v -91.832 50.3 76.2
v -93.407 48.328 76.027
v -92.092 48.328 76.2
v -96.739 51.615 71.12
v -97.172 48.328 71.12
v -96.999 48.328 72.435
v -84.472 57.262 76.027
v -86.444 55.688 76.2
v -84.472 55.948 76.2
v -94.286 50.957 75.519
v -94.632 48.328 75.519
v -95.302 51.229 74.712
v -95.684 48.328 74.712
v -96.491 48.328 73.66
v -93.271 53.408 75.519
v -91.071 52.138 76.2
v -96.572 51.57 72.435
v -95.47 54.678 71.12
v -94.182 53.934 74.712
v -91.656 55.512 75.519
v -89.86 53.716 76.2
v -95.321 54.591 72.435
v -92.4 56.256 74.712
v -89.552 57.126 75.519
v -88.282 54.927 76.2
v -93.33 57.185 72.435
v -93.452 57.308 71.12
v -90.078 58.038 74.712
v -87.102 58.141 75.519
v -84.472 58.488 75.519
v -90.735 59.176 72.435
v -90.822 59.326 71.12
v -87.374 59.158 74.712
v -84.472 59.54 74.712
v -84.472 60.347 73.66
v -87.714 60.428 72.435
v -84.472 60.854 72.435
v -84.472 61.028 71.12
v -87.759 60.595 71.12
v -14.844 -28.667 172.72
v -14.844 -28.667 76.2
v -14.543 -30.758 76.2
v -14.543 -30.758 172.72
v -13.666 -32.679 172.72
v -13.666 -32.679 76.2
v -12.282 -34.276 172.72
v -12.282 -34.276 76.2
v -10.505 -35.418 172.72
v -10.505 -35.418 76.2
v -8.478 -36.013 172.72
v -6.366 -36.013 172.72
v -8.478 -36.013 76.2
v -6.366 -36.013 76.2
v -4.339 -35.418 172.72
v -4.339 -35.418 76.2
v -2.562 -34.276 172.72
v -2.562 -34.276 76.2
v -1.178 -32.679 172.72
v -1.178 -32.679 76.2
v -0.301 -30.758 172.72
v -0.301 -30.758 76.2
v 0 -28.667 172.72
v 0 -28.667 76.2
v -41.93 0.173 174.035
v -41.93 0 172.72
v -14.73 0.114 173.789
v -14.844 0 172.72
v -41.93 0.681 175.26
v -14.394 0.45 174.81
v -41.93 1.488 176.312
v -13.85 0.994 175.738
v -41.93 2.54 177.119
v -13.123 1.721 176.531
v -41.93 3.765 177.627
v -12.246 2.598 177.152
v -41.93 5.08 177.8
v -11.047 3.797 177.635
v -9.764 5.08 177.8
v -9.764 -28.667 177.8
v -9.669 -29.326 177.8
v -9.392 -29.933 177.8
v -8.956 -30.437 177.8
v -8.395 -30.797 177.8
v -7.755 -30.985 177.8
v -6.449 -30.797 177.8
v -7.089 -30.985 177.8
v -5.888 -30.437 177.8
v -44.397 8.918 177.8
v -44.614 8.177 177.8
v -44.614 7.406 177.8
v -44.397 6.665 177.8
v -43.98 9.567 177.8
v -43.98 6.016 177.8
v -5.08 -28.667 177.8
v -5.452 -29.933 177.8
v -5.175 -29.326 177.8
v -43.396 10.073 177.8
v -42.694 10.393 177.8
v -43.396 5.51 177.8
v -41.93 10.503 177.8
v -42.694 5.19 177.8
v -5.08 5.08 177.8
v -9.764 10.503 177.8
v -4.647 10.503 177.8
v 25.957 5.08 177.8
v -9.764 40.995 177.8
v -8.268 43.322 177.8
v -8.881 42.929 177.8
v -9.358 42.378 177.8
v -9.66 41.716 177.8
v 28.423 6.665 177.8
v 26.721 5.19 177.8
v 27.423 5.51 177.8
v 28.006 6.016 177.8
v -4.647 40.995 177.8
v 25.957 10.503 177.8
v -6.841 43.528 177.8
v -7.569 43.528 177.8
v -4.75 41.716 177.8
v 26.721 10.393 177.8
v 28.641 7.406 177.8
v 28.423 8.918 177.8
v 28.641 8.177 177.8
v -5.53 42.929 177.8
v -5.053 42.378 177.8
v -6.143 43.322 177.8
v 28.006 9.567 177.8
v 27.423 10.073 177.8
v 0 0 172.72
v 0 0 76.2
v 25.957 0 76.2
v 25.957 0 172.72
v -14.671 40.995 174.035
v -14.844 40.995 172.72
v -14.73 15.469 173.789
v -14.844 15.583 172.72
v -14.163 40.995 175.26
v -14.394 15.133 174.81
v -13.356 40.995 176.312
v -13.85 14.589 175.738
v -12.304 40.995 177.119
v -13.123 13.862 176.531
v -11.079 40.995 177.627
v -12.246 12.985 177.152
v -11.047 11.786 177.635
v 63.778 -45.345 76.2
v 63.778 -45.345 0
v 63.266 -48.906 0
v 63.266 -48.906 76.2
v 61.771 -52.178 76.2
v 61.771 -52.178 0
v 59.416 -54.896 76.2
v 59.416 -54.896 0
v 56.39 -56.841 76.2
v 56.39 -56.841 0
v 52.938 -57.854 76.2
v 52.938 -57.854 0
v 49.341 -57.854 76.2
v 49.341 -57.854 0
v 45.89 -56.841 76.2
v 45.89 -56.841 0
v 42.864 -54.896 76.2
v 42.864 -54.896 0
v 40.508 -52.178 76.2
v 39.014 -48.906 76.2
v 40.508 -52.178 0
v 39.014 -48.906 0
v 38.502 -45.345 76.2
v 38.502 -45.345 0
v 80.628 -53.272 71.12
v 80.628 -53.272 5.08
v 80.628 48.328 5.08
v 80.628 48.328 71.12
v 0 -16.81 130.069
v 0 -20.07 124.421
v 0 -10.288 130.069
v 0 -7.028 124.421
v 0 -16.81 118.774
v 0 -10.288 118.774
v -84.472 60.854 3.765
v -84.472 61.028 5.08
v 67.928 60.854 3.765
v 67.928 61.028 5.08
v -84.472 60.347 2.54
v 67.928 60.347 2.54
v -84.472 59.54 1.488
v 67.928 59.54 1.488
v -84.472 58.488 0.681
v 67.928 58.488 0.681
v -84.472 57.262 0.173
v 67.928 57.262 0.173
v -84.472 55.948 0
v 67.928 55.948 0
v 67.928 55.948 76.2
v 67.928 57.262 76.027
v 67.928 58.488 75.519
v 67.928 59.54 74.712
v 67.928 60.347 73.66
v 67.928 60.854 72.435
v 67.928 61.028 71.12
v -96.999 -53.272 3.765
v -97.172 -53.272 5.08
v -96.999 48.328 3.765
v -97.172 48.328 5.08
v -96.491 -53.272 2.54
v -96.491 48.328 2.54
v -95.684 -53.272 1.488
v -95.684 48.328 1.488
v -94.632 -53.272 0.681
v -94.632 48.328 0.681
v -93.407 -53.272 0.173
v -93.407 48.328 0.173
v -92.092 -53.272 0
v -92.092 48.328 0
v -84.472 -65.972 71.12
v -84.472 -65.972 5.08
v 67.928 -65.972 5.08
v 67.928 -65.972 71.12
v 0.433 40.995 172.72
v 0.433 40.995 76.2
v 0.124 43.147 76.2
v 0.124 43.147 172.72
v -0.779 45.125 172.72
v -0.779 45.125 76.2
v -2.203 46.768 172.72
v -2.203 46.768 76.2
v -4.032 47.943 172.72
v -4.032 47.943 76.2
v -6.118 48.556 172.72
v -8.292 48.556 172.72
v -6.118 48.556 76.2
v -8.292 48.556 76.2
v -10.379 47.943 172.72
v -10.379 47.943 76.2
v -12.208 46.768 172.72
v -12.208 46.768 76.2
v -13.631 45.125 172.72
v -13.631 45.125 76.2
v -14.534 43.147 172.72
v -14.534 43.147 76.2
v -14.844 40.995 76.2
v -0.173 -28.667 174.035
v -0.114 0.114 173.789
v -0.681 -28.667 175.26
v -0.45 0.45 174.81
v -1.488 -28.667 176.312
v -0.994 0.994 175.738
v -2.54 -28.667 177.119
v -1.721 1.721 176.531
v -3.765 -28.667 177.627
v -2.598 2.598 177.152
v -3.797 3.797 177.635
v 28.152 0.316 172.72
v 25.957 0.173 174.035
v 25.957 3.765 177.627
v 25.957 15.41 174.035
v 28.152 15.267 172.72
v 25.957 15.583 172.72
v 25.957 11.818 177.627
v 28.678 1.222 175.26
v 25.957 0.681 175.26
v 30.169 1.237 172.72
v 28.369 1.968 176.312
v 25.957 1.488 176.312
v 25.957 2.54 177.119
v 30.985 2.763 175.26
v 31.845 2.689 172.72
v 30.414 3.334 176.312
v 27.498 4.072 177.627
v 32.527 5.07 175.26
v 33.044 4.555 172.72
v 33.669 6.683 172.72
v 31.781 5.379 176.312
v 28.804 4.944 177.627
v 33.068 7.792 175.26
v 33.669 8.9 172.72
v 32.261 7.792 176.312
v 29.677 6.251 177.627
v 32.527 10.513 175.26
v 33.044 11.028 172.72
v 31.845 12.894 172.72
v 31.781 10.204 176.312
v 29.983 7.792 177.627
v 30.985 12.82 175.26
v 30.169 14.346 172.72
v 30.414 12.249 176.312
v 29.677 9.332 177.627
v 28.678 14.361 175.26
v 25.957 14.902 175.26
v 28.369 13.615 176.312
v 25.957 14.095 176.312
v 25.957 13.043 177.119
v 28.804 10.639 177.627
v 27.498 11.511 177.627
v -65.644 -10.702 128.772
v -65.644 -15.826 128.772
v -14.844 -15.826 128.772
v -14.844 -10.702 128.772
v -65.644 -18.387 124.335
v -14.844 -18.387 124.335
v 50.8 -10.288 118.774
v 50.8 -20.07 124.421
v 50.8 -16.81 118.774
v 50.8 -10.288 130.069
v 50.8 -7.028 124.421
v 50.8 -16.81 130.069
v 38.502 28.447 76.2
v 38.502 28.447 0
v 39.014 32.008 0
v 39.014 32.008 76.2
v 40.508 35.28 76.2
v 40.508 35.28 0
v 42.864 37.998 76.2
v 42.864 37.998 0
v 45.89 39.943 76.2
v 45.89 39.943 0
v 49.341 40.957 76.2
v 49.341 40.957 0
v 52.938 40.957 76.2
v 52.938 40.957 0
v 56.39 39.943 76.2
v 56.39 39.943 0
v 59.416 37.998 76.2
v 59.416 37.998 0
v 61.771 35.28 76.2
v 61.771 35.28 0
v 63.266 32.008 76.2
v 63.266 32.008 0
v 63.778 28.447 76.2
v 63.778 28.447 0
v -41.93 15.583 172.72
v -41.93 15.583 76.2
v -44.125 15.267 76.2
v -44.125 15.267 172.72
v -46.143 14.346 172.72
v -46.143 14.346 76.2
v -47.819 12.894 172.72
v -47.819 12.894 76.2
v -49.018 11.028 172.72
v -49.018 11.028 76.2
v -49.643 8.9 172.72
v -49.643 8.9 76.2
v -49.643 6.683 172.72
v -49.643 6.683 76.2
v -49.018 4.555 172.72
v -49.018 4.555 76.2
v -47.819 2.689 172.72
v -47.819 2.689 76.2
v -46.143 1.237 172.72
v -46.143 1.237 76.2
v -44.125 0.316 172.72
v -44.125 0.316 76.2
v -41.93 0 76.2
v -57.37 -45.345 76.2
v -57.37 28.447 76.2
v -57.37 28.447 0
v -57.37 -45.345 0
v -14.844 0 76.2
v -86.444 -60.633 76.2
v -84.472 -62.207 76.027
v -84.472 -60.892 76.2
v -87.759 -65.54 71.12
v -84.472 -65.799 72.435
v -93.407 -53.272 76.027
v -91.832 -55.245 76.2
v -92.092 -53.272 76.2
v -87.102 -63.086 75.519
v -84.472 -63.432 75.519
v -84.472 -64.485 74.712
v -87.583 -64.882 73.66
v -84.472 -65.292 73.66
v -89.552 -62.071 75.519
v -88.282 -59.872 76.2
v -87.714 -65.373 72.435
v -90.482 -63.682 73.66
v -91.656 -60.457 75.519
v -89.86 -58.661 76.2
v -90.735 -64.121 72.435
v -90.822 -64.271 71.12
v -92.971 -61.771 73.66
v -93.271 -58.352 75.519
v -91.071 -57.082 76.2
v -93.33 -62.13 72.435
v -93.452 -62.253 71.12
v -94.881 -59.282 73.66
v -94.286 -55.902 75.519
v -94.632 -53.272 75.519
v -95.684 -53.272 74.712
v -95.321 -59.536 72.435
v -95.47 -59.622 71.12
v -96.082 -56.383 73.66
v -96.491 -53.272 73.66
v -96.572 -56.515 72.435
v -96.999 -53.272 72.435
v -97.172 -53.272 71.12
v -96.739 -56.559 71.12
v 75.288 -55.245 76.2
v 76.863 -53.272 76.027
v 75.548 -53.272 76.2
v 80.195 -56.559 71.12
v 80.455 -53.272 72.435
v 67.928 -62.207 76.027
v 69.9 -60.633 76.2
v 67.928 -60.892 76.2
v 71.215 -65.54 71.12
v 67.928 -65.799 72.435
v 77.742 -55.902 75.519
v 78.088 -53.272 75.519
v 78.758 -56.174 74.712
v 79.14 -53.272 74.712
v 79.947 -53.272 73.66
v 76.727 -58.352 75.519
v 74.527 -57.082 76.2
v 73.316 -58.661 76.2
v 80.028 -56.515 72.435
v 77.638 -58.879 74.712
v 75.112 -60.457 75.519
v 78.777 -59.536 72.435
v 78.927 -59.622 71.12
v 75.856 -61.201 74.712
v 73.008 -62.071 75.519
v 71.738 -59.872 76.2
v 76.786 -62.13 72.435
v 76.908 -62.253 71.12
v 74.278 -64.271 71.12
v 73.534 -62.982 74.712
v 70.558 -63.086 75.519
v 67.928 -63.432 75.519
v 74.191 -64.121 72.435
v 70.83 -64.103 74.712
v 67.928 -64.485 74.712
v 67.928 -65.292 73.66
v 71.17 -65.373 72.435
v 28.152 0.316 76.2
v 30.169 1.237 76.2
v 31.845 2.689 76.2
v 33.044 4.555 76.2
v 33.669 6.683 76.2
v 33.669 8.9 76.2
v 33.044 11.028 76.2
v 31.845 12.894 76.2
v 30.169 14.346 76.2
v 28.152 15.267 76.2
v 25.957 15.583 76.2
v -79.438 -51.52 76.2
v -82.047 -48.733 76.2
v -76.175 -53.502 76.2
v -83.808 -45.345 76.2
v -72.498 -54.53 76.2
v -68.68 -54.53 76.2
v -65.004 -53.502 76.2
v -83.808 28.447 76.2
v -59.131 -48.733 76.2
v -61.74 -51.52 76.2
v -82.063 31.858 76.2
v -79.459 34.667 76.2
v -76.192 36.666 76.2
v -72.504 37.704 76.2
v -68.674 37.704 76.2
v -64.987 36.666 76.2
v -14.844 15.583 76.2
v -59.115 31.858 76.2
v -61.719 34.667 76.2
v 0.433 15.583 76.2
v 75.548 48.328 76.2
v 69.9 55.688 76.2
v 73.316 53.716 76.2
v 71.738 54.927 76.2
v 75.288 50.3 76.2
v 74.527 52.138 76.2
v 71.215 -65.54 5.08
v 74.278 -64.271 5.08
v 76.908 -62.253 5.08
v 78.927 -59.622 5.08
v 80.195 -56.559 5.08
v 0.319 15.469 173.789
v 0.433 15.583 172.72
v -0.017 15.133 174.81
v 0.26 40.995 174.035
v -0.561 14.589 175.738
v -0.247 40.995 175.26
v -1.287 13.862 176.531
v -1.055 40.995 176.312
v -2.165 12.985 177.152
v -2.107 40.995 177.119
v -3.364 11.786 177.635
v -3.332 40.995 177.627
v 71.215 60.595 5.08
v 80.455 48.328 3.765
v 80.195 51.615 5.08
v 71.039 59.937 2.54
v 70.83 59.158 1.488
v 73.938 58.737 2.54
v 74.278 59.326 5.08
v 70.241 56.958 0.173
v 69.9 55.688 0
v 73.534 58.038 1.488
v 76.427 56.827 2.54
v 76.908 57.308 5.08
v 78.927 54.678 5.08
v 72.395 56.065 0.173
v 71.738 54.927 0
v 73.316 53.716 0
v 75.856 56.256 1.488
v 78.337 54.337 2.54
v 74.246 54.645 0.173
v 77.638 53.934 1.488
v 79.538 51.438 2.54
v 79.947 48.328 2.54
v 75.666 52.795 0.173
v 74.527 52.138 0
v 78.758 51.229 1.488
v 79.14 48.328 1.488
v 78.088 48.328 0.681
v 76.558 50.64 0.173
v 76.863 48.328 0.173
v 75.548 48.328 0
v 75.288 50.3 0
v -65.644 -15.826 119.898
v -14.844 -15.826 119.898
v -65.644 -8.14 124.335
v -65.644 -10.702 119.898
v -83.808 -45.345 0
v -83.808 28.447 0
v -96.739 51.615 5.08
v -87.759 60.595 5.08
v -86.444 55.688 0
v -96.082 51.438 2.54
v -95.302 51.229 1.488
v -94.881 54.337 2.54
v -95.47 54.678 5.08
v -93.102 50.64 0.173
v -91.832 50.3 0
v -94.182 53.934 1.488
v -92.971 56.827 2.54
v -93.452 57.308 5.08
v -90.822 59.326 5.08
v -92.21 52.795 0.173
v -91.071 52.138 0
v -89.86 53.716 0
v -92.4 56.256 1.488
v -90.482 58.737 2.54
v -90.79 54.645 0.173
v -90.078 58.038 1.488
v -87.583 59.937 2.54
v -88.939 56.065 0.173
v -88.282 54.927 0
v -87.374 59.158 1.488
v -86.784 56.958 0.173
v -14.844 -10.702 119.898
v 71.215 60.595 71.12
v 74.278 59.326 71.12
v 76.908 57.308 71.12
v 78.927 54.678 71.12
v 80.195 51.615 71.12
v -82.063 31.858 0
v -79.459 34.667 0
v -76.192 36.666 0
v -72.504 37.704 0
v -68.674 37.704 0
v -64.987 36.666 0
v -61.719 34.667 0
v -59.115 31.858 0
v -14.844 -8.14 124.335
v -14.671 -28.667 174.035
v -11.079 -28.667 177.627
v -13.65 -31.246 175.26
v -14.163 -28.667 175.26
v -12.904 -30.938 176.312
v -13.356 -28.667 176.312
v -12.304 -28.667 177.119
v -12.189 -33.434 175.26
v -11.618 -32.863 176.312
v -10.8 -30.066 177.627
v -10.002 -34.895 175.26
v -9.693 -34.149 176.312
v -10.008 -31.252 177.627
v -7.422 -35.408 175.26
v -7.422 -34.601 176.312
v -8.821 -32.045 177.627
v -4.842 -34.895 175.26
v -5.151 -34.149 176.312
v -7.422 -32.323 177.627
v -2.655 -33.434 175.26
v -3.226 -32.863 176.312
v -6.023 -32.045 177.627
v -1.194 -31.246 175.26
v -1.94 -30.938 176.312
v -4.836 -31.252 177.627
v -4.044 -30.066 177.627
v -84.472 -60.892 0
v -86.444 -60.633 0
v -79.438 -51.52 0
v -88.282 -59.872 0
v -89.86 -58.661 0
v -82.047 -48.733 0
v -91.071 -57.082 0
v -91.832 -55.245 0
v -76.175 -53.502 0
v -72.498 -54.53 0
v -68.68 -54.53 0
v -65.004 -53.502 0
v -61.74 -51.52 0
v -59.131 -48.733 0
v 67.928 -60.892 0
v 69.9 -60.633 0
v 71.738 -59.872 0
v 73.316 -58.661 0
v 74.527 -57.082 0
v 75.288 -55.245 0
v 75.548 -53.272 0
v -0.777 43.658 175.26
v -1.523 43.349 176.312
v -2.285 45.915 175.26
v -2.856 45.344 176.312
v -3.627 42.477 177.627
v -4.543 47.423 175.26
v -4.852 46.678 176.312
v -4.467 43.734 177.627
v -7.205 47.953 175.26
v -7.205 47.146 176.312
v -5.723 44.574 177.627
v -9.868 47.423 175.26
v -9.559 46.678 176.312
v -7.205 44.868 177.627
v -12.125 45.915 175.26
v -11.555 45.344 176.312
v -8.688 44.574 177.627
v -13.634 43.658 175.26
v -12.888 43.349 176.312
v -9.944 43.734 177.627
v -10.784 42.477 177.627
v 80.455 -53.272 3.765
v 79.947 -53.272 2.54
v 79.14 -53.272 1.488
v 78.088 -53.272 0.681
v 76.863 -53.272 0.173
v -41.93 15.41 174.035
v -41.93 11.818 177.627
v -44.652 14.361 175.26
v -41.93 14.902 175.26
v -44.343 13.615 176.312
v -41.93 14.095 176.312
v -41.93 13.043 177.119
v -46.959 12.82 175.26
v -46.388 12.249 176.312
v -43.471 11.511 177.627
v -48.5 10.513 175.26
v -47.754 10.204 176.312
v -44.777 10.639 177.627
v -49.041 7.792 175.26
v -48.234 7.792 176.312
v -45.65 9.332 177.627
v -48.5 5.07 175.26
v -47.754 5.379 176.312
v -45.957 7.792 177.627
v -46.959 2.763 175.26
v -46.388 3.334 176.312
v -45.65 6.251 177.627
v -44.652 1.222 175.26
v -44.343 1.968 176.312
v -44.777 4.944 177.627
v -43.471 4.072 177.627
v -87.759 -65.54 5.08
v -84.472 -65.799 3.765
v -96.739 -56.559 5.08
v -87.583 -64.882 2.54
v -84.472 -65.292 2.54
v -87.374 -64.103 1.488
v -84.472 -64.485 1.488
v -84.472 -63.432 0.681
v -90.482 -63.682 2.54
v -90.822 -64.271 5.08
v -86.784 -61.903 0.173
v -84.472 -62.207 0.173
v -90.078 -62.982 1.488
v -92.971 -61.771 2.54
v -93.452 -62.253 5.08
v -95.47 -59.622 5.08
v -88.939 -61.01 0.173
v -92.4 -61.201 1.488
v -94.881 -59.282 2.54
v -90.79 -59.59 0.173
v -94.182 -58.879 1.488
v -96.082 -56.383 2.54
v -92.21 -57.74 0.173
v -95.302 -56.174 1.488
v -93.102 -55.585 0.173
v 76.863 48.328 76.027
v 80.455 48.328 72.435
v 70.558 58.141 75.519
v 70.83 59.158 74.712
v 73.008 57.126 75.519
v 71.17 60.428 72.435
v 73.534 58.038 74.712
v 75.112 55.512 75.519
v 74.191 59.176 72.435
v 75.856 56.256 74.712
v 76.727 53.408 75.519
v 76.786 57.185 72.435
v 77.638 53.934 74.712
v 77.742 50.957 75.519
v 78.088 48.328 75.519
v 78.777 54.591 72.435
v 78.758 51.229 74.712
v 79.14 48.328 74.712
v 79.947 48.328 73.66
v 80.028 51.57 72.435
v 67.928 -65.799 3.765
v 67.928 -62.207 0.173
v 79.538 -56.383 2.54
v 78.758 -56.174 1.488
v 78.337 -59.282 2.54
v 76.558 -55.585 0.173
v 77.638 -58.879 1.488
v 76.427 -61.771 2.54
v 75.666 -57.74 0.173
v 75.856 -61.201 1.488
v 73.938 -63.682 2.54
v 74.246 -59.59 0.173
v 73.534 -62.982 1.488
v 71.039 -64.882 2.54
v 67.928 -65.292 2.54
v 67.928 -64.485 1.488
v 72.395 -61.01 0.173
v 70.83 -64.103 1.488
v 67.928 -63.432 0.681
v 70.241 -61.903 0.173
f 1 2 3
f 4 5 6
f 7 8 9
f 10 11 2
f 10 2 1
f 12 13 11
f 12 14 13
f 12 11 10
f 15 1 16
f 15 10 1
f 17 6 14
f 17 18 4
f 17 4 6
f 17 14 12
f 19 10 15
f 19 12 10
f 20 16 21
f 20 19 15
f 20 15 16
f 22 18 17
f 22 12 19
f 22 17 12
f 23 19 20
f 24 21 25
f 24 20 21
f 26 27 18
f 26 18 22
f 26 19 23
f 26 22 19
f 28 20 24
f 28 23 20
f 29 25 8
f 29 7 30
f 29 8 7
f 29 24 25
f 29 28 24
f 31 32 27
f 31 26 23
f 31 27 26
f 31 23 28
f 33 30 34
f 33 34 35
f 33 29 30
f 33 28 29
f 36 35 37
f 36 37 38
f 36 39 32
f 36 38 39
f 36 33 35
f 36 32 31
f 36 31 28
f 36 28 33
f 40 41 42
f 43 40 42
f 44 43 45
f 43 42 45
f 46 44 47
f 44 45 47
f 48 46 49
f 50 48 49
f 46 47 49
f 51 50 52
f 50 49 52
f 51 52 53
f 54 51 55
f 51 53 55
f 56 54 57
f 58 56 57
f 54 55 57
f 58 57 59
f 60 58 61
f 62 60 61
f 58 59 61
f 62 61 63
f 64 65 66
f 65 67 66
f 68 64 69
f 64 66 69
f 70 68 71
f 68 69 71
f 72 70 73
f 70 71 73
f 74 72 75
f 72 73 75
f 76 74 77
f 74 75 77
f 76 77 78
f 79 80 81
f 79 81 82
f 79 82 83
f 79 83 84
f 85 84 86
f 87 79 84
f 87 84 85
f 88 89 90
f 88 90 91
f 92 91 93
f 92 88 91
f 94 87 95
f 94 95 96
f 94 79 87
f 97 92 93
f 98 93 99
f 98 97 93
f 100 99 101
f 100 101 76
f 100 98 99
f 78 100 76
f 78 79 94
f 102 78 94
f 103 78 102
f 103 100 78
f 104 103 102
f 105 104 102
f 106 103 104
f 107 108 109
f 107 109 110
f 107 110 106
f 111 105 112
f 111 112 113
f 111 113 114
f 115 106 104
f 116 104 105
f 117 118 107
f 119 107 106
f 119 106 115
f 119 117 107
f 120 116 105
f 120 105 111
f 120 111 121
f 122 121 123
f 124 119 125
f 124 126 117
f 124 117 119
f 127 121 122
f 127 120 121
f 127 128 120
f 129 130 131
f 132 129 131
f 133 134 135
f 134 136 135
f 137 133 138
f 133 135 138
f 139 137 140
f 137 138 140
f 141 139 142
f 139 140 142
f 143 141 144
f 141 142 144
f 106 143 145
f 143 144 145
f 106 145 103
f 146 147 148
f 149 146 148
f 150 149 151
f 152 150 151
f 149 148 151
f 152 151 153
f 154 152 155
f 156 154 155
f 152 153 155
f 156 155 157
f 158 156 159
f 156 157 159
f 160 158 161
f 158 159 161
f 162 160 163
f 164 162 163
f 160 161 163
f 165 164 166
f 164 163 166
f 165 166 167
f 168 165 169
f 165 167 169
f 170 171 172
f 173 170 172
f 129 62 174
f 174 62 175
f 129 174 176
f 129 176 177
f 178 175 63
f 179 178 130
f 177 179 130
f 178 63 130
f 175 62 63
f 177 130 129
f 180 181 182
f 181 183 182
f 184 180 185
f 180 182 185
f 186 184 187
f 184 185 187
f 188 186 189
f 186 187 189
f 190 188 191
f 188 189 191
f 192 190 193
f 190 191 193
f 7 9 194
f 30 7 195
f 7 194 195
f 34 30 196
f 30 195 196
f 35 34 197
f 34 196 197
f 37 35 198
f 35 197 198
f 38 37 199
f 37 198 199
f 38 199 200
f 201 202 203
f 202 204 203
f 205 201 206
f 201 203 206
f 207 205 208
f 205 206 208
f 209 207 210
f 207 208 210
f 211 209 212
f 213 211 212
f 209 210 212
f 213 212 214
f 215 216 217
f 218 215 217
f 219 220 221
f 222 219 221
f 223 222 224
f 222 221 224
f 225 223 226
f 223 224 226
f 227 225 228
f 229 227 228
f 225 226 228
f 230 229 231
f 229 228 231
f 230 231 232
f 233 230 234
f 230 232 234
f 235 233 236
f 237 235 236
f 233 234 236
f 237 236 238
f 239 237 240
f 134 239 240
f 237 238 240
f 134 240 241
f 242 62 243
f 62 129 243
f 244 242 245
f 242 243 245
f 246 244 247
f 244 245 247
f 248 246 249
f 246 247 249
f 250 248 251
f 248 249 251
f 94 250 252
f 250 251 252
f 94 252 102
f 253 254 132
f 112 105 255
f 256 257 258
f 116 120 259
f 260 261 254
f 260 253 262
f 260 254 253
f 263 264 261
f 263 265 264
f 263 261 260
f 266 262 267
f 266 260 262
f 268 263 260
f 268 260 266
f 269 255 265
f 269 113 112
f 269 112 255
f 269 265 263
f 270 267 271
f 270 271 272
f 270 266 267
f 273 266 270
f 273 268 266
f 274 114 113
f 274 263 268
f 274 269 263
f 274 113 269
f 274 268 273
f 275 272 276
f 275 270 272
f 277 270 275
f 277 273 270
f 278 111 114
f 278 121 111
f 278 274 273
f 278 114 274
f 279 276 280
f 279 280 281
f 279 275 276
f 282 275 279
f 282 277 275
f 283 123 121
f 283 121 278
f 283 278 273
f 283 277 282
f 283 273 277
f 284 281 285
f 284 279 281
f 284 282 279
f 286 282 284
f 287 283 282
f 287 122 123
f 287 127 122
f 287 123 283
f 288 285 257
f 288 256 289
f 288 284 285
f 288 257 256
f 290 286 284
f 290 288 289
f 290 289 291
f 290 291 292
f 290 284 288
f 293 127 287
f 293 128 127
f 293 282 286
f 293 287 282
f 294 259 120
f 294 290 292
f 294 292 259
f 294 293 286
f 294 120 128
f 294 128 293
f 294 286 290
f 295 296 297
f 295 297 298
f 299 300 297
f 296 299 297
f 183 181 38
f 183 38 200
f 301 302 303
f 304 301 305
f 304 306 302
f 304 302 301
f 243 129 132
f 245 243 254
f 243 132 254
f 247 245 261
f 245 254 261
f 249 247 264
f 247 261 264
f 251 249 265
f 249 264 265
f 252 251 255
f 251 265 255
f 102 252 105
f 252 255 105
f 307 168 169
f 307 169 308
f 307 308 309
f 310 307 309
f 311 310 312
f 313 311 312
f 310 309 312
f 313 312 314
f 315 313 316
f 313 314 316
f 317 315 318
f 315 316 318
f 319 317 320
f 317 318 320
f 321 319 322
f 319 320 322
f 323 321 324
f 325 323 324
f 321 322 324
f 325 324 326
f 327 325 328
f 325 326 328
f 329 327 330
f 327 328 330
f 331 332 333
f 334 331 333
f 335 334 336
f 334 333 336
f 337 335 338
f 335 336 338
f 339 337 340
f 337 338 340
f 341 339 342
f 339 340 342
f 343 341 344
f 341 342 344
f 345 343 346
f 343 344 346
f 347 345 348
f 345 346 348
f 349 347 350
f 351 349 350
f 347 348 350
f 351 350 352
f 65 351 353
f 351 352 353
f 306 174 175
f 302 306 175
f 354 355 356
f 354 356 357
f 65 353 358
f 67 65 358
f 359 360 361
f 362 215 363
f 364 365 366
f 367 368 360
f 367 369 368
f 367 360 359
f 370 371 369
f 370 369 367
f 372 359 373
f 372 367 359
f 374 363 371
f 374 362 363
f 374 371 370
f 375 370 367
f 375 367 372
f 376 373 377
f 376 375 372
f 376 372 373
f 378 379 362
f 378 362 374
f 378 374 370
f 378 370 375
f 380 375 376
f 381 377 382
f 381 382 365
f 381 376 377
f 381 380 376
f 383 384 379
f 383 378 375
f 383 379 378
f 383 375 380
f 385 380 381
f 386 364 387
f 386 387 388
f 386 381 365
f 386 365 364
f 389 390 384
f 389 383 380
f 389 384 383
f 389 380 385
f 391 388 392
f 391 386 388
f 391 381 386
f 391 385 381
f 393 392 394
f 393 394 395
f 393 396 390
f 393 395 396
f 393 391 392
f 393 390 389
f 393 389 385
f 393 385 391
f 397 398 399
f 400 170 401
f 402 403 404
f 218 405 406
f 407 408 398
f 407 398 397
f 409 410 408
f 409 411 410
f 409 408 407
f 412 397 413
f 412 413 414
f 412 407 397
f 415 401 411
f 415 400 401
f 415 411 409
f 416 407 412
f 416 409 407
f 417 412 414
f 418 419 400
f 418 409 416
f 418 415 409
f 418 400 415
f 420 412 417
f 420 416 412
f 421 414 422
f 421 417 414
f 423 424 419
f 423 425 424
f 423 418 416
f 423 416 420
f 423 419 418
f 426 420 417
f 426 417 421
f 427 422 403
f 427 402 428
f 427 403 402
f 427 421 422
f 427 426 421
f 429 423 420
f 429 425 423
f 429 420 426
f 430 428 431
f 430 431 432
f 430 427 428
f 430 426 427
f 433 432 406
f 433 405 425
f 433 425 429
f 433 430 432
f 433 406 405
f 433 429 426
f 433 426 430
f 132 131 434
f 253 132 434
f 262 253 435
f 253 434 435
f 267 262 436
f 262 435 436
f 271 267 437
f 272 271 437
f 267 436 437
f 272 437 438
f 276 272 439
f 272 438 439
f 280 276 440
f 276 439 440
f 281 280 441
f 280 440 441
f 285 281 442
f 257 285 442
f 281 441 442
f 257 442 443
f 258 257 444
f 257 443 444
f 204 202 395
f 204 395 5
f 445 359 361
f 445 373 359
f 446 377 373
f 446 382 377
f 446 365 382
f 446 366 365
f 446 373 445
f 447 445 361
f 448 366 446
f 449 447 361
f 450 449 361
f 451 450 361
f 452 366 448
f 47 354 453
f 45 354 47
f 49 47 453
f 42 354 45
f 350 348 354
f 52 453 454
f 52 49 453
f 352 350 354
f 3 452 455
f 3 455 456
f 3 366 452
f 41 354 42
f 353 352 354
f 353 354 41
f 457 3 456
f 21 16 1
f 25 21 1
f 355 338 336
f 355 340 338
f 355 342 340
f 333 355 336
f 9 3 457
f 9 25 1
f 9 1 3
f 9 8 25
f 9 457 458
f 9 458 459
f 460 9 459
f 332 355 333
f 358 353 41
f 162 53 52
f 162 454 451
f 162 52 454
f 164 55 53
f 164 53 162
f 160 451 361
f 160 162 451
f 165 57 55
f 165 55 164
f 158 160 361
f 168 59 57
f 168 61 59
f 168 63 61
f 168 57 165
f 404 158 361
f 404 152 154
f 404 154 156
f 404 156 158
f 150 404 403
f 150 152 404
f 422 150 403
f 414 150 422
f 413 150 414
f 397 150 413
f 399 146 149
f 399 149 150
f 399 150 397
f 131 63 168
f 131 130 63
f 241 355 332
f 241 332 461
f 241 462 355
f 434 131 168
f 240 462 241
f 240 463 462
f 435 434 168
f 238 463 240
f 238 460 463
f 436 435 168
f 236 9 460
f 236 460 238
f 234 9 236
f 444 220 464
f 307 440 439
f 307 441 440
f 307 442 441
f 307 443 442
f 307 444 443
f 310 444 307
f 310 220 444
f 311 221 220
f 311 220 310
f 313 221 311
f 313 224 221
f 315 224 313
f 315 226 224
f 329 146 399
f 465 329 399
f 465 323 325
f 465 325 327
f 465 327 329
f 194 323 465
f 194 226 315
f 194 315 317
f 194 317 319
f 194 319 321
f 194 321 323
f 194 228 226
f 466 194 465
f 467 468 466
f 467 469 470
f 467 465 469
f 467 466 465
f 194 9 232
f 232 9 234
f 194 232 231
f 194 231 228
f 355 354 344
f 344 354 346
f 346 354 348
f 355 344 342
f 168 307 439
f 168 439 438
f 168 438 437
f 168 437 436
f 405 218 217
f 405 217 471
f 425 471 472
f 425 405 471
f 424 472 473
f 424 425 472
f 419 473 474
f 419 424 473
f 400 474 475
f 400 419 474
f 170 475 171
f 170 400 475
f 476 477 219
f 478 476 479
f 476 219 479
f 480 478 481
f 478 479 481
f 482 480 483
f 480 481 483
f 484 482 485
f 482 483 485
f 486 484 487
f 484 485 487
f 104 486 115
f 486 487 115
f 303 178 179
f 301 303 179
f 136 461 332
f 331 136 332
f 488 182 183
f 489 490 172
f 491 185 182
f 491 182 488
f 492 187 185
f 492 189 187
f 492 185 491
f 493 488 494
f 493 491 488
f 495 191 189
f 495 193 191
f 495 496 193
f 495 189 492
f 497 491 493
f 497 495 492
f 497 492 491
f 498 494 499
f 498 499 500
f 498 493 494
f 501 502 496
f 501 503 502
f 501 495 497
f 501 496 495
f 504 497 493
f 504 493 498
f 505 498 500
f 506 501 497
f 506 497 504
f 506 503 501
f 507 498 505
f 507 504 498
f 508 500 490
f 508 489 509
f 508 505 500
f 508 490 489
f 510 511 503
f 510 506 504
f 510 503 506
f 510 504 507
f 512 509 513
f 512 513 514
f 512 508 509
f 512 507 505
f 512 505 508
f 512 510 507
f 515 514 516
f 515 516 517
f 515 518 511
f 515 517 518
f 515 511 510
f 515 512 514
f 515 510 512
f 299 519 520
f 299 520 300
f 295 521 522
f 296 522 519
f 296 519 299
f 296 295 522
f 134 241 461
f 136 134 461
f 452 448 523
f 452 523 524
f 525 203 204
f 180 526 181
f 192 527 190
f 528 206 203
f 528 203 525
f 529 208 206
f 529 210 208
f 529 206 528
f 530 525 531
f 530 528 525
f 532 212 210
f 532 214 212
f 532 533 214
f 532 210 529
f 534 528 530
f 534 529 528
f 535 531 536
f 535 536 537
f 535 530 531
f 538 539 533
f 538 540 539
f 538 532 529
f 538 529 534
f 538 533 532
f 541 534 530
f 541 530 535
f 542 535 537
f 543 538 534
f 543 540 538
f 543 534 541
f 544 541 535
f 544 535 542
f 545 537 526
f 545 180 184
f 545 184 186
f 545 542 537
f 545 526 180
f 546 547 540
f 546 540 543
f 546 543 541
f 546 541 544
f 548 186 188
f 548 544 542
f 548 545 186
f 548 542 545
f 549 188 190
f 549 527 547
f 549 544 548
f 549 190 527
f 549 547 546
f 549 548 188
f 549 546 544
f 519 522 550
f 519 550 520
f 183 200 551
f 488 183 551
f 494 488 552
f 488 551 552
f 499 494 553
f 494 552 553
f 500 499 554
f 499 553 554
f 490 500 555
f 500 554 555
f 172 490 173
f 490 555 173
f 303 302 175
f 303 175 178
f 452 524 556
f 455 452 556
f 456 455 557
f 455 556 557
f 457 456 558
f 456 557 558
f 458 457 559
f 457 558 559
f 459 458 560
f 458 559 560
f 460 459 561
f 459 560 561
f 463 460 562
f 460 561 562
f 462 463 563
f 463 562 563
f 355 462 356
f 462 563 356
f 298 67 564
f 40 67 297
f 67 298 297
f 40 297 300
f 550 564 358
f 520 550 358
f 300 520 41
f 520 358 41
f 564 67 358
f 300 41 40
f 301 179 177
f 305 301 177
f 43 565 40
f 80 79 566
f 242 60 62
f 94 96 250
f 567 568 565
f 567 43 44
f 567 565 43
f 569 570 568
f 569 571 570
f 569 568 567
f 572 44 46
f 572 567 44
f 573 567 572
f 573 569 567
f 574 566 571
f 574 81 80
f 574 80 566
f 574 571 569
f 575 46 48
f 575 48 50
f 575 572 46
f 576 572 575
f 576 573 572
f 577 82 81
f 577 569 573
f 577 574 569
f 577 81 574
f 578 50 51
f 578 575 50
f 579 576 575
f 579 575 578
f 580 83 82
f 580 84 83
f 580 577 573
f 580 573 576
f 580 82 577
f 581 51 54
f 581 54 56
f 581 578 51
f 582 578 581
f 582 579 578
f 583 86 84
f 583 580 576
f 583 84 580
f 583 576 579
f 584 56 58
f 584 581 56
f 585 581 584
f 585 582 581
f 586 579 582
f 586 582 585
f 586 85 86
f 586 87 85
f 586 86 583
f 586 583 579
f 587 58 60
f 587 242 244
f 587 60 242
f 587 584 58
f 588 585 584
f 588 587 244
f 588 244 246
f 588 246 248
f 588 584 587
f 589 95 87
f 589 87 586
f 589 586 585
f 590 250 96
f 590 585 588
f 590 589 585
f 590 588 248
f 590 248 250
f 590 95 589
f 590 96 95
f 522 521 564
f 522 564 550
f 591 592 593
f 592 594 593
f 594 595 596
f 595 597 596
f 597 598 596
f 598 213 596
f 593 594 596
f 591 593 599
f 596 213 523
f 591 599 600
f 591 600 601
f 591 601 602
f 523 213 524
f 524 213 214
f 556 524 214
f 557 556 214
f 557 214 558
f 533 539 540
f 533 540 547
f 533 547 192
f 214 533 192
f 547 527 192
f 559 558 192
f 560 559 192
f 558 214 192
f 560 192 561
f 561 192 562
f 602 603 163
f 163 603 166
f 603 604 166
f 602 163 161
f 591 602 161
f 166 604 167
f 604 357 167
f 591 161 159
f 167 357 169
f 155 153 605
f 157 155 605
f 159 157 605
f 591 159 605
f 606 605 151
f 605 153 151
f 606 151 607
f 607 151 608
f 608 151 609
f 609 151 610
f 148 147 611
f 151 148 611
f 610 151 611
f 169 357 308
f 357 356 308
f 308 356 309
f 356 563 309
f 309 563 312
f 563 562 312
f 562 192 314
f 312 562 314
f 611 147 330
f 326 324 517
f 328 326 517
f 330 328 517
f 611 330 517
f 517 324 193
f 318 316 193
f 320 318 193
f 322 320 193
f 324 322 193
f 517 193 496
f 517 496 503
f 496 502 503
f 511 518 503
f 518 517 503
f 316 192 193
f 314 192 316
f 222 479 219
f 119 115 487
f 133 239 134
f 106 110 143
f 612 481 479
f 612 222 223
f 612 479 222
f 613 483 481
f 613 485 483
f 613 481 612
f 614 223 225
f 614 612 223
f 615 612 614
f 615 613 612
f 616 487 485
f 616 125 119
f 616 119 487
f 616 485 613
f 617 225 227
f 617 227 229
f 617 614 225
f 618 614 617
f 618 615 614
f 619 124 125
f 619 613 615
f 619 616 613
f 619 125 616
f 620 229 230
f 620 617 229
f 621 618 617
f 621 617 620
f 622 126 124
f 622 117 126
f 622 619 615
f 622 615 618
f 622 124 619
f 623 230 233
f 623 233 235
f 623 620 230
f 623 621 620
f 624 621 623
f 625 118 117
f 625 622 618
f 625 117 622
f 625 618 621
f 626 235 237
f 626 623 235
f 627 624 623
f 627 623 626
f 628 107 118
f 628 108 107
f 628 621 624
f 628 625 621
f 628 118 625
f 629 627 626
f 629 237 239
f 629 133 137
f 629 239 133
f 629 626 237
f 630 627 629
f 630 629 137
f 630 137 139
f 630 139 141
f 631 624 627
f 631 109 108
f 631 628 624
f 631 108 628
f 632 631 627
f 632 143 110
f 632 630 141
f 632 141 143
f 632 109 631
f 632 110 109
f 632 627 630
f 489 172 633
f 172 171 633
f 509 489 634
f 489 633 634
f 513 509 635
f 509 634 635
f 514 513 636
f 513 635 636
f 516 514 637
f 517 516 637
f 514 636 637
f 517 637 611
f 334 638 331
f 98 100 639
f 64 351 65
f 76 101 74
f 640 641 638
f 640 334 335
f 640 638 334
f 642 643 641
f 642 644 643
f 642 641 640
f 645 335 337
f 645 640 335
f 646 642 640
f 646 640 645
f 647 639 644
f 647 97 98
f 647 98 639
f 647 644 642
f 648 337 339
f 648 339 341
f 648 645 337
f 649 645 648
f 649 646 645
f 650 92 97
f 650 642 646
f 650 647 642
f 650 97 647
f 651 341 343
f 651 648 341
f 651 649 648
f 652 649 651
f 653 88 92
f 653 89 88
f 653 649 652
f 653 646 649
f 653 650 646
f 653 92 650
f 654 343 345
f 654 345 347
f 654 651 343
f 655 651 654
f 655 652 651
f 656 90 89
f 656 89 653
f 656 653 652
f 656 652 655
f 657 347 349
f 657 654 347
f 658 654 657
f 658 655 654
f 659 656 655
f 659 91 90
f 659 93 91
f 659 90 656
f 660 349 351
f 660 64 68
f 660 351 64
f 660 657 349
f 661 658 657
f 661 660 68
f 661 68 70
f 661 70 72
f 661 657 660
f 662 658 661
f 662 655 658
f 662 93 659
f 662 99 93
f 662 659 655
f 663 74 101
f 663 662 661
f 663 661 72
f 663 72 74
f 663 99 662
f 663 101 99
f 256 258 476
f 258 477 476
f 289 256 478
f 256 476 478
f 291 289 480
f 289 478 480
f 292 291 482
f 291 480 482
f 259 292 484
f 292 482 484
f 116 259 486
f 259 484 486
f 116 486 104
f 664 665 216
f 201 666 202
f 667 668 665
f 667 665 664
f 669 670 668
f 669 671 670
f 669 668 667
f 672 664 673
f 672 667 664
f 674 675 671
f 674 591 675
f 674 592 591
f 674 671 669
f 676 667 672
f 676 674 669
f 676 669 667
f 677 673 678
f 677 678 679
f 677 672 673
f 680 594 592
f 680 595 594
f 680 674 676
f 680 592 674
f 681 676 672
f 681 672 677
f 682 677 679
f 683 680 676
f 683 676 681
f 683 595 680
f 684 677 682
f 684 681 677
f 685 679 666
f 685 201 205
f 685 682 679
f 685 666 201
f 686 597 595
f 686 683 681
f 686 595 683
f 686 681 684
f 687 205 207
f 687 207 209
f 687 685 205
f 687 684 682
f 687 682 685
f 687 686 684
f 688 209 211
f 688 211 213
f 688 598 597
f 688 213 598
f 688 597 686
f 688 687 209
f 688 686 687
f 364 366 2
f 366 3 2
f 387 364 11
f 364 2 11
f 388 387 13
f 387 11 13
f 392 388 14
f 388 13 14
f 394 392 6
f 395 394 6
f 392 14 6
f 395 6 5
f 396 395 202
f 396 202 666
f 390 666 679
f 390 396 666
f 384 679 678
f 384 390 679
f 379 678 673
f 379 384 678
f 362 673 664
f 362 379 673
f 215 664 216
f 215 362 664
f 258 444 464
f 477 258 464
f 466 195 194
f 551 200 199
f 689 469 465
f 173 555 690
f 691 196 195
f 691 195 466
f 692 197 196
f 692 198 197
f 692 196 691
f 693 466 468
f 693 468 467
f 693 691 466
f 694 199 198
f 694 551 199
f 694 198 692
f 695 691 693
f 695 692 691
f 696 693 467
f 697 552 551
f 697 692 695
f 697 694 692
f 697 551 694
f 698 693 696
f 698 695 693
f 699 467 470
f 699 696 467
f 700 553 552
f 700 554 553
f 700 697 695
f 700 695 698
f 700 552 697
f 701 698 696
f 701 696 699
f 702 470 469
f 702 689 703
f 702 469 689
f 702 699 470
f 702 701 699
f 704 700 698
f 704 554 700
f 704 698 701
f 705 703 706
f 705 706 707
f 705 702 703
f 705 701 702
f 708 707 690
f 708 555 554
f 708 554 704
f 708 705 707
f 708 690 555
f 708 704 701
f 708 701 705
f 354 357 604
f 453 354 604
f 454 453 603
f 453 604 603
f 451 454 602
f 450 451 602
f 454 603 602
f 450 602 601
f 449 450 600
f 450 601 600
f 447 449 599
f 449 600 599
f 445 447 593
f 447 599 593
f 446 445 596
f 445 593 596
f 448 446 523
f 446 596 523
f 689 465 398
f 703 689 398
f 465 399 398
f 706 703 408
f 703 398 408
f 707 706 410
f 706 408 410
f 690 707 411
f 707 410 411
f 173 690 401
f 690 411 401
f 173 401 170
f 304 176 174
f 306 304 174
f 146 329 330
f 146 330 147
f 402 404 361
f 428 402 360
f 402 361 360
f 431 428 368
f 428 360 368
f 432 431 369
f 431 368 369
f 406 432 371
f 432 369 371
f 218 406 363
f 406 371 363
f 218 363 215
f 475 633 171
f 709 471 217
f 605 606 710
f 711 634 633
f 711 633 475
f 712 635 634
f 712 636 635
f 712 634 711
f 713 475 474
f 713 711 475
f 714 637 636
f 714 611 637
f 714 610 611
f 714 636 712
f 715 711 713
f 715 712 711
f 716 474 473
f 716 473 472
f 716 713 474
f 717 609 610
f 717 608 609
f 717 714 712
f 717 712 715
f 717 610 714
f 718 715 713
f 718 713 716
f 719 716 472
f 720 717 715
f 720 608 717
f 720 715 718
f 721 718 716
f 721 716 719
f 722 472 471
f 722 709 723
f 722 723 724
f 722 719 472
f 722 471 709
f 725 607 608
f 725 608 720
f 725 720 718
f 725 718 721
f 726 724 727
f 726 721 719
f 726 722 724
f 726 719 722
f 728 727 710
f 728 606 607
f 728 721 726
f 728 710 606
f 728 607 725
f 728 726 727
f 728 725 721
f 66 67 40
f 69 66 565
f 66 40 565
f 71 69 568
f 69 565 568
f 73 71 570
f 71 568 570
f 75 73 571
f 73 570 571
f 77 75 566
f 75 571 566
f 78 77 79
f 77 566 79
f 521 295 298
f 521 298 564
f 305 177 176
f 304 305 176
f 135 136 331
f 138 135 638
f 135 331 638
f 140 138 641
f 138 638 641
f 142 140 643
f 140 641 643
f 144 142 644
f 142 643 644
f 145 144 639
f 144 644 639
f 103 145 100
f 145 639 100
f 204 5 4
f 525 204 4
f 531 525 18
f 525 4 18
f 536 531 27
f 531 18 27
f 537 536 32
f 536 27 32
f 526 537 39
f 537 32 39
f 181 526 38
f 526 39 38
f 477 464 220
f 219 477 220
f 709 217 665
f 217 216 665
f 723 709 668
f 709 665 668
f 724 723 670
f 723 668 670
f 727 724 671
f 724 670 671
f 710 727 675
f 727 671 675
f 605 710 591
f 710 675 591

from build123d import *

# Parameters (mm, degrees)
F0_W     = 177.8
F0_H     = 127
F1_DEPTH = 76.2
F2_R     = 12.7
F4_DEPTH = 101.6
F6_DEPTH = 50.8
F8_DEPTH = 50.8
F9_R     = 5.08
F10_R    = 5.08


with BuildPart() as f1:
    # F0 (on Top) → F1 (new body)
    with BuildSketch(Plane.XY):
        with Locations((-8.271977, -2.472461)):
            Rectangle(F0_W, F0_H)
        with BuildLine():
            Line((-83.807927, -45.345337), (-83.807927, 28.44747))
            ThreePointArc((-83.807927, 28.44747), (-70.589135, 37.835685), (-57.370342, 28.44747))
            Line((-57.370342, 28.44747), (-57.370342, -45.345337))
            ThreePointArc((-57.370342, -45.345337), (-70.589135, -54.660871), (-83.807927, -45.345337))
        make_face(mode=Mode.SUBTRACT)
        with BuildLine():
            ThreePointArc((38.502203, 28.44747), (51.139944, 41.085211), (63.777684, 28.44747))
            Line((63.777684, 28.44747), (63.777684, -45.345337))
            ThreePointArc((63.777684, -45.345337), (51.139944, -57.983078), (38.502203, -45.345337))
            Line((38.502203, -45.345337), (38.502203, 28.44747))
        make_face(mode=Mode.SUBTRACT)
    extrude(amount=F1_DEPTH)

    # F2
    f2_edges = [f1.edges().sort_by_distance(p)[0] for p in [
        (80.628023, 61.027539, 38.1),
        (80.628023, -65.972461, 38.1),
        (-97.171977, 61.027539, 38.1),
        (-97.171977, -65.972461, 38.1),
    ]]
    fillet(f2_edges, radius=F2_R)

    # F3 (on face) → F4 (join)
    with BuildSketch(Plane.XY.offset(76.2)):
        with BuildLine():
            ThreePointArc((0.43315, 40.995162), (-7.205375, 48.633687), (-14.8439, 40.995162))
            Line((-14.8439, 40.995162), (-14.8439, 15.583021))
            Line((-14.8439, 15.583021), (-41.930374, 15.583021))
            ThreePointArc((-41.930374, 15.583021), (-49.721884, 7.79151), (-41.930374, 0))
            Line((-41.930374, 0), (-14.8439, 0))
            Line((-14.8439, 0), (-14.8439, -28.666684))
            ThreePointArc((-14.8439, -28.666684), (-7.42195, -36.088634), (0, -28.666684))
            Line((0, -28.666684), (0, 0))
            Line((0, 0), (25.956901, 0))
            ThreePointArc((25.956901, 0), (33.748411, 7.79151), (25.956901, 15.583021))
            Line((25.956901, 15.583021), (0.43315, 15.583021))
            Line((0.43315, 15.583021), (0.43315, 40.995162))
        make_face()
    extrude(amount=F4_DEPTH)

    # F5 (on face) → F6 (join)
    with BuildSketch(Plane.YZ):
        Polygon((-16.809505, 118.773863), (-10.288356, 118.773863), (-7.027781, 124.421343), (-10.288356, 130.068824), (-16.809505, 130.068824), (-20.070079, 124.421343), align=None)
    extrude(amount=F6_DEPTH)

    # F7 (on face) → F8 (join)
    with BuildSketch(Plane(origin=(-14.8439, 0, 0), x_dir=(0, -1, 0), z_dir=(-1, 0, 0))):
        Polygon((15.825561, 128.772154), (10.70182, 128.772154), (8.139949, 124.334864), (10.70182, 119.897574), (15.825561, 119.897574), (18.387432, 124.334864), align=None)
    extrude(amount=F8_DEPTH)

    # F9
    f9_edges = [f1.edges().sort_by_distance(p)[0] for p in [
        (0.43315, 28.289091, 177.8),
        (-7.205375, 48.633687, 177.8),
        (-14.8439, 28.289091, 177.8),
        (-28.387137, 15.583021, 177.8),
        (-49.721884, 7.79151, 177.8),
        (-28.387137, 0, 177.8),
        (-14.8439, -14.333342, 177.8),
        (-7.42195, -36.088634, 177.8),
        (0, -14.333342, 177.8),
        (12.97845, 0, 177.8),
        (33.748411, 7.79151, 177.8),
        (13.195026, 15.583021, 177.8),
    ]]
    fillet(f9_edges, radius=F9_R)

    # F10
    f10_edges = [f1.edges().sort_by_distance(p)[0] for p in [
        (-97.171977, -2.472461, 0),
        (-97.171977, 48.327539, 38.1),
        (-97.171977, -53.272461, 38.1),
        (-97.171977, -2.472461, 76.2),
    ]]
    fillet(f10_edges, radius=F10_R)


solid = f1.part
